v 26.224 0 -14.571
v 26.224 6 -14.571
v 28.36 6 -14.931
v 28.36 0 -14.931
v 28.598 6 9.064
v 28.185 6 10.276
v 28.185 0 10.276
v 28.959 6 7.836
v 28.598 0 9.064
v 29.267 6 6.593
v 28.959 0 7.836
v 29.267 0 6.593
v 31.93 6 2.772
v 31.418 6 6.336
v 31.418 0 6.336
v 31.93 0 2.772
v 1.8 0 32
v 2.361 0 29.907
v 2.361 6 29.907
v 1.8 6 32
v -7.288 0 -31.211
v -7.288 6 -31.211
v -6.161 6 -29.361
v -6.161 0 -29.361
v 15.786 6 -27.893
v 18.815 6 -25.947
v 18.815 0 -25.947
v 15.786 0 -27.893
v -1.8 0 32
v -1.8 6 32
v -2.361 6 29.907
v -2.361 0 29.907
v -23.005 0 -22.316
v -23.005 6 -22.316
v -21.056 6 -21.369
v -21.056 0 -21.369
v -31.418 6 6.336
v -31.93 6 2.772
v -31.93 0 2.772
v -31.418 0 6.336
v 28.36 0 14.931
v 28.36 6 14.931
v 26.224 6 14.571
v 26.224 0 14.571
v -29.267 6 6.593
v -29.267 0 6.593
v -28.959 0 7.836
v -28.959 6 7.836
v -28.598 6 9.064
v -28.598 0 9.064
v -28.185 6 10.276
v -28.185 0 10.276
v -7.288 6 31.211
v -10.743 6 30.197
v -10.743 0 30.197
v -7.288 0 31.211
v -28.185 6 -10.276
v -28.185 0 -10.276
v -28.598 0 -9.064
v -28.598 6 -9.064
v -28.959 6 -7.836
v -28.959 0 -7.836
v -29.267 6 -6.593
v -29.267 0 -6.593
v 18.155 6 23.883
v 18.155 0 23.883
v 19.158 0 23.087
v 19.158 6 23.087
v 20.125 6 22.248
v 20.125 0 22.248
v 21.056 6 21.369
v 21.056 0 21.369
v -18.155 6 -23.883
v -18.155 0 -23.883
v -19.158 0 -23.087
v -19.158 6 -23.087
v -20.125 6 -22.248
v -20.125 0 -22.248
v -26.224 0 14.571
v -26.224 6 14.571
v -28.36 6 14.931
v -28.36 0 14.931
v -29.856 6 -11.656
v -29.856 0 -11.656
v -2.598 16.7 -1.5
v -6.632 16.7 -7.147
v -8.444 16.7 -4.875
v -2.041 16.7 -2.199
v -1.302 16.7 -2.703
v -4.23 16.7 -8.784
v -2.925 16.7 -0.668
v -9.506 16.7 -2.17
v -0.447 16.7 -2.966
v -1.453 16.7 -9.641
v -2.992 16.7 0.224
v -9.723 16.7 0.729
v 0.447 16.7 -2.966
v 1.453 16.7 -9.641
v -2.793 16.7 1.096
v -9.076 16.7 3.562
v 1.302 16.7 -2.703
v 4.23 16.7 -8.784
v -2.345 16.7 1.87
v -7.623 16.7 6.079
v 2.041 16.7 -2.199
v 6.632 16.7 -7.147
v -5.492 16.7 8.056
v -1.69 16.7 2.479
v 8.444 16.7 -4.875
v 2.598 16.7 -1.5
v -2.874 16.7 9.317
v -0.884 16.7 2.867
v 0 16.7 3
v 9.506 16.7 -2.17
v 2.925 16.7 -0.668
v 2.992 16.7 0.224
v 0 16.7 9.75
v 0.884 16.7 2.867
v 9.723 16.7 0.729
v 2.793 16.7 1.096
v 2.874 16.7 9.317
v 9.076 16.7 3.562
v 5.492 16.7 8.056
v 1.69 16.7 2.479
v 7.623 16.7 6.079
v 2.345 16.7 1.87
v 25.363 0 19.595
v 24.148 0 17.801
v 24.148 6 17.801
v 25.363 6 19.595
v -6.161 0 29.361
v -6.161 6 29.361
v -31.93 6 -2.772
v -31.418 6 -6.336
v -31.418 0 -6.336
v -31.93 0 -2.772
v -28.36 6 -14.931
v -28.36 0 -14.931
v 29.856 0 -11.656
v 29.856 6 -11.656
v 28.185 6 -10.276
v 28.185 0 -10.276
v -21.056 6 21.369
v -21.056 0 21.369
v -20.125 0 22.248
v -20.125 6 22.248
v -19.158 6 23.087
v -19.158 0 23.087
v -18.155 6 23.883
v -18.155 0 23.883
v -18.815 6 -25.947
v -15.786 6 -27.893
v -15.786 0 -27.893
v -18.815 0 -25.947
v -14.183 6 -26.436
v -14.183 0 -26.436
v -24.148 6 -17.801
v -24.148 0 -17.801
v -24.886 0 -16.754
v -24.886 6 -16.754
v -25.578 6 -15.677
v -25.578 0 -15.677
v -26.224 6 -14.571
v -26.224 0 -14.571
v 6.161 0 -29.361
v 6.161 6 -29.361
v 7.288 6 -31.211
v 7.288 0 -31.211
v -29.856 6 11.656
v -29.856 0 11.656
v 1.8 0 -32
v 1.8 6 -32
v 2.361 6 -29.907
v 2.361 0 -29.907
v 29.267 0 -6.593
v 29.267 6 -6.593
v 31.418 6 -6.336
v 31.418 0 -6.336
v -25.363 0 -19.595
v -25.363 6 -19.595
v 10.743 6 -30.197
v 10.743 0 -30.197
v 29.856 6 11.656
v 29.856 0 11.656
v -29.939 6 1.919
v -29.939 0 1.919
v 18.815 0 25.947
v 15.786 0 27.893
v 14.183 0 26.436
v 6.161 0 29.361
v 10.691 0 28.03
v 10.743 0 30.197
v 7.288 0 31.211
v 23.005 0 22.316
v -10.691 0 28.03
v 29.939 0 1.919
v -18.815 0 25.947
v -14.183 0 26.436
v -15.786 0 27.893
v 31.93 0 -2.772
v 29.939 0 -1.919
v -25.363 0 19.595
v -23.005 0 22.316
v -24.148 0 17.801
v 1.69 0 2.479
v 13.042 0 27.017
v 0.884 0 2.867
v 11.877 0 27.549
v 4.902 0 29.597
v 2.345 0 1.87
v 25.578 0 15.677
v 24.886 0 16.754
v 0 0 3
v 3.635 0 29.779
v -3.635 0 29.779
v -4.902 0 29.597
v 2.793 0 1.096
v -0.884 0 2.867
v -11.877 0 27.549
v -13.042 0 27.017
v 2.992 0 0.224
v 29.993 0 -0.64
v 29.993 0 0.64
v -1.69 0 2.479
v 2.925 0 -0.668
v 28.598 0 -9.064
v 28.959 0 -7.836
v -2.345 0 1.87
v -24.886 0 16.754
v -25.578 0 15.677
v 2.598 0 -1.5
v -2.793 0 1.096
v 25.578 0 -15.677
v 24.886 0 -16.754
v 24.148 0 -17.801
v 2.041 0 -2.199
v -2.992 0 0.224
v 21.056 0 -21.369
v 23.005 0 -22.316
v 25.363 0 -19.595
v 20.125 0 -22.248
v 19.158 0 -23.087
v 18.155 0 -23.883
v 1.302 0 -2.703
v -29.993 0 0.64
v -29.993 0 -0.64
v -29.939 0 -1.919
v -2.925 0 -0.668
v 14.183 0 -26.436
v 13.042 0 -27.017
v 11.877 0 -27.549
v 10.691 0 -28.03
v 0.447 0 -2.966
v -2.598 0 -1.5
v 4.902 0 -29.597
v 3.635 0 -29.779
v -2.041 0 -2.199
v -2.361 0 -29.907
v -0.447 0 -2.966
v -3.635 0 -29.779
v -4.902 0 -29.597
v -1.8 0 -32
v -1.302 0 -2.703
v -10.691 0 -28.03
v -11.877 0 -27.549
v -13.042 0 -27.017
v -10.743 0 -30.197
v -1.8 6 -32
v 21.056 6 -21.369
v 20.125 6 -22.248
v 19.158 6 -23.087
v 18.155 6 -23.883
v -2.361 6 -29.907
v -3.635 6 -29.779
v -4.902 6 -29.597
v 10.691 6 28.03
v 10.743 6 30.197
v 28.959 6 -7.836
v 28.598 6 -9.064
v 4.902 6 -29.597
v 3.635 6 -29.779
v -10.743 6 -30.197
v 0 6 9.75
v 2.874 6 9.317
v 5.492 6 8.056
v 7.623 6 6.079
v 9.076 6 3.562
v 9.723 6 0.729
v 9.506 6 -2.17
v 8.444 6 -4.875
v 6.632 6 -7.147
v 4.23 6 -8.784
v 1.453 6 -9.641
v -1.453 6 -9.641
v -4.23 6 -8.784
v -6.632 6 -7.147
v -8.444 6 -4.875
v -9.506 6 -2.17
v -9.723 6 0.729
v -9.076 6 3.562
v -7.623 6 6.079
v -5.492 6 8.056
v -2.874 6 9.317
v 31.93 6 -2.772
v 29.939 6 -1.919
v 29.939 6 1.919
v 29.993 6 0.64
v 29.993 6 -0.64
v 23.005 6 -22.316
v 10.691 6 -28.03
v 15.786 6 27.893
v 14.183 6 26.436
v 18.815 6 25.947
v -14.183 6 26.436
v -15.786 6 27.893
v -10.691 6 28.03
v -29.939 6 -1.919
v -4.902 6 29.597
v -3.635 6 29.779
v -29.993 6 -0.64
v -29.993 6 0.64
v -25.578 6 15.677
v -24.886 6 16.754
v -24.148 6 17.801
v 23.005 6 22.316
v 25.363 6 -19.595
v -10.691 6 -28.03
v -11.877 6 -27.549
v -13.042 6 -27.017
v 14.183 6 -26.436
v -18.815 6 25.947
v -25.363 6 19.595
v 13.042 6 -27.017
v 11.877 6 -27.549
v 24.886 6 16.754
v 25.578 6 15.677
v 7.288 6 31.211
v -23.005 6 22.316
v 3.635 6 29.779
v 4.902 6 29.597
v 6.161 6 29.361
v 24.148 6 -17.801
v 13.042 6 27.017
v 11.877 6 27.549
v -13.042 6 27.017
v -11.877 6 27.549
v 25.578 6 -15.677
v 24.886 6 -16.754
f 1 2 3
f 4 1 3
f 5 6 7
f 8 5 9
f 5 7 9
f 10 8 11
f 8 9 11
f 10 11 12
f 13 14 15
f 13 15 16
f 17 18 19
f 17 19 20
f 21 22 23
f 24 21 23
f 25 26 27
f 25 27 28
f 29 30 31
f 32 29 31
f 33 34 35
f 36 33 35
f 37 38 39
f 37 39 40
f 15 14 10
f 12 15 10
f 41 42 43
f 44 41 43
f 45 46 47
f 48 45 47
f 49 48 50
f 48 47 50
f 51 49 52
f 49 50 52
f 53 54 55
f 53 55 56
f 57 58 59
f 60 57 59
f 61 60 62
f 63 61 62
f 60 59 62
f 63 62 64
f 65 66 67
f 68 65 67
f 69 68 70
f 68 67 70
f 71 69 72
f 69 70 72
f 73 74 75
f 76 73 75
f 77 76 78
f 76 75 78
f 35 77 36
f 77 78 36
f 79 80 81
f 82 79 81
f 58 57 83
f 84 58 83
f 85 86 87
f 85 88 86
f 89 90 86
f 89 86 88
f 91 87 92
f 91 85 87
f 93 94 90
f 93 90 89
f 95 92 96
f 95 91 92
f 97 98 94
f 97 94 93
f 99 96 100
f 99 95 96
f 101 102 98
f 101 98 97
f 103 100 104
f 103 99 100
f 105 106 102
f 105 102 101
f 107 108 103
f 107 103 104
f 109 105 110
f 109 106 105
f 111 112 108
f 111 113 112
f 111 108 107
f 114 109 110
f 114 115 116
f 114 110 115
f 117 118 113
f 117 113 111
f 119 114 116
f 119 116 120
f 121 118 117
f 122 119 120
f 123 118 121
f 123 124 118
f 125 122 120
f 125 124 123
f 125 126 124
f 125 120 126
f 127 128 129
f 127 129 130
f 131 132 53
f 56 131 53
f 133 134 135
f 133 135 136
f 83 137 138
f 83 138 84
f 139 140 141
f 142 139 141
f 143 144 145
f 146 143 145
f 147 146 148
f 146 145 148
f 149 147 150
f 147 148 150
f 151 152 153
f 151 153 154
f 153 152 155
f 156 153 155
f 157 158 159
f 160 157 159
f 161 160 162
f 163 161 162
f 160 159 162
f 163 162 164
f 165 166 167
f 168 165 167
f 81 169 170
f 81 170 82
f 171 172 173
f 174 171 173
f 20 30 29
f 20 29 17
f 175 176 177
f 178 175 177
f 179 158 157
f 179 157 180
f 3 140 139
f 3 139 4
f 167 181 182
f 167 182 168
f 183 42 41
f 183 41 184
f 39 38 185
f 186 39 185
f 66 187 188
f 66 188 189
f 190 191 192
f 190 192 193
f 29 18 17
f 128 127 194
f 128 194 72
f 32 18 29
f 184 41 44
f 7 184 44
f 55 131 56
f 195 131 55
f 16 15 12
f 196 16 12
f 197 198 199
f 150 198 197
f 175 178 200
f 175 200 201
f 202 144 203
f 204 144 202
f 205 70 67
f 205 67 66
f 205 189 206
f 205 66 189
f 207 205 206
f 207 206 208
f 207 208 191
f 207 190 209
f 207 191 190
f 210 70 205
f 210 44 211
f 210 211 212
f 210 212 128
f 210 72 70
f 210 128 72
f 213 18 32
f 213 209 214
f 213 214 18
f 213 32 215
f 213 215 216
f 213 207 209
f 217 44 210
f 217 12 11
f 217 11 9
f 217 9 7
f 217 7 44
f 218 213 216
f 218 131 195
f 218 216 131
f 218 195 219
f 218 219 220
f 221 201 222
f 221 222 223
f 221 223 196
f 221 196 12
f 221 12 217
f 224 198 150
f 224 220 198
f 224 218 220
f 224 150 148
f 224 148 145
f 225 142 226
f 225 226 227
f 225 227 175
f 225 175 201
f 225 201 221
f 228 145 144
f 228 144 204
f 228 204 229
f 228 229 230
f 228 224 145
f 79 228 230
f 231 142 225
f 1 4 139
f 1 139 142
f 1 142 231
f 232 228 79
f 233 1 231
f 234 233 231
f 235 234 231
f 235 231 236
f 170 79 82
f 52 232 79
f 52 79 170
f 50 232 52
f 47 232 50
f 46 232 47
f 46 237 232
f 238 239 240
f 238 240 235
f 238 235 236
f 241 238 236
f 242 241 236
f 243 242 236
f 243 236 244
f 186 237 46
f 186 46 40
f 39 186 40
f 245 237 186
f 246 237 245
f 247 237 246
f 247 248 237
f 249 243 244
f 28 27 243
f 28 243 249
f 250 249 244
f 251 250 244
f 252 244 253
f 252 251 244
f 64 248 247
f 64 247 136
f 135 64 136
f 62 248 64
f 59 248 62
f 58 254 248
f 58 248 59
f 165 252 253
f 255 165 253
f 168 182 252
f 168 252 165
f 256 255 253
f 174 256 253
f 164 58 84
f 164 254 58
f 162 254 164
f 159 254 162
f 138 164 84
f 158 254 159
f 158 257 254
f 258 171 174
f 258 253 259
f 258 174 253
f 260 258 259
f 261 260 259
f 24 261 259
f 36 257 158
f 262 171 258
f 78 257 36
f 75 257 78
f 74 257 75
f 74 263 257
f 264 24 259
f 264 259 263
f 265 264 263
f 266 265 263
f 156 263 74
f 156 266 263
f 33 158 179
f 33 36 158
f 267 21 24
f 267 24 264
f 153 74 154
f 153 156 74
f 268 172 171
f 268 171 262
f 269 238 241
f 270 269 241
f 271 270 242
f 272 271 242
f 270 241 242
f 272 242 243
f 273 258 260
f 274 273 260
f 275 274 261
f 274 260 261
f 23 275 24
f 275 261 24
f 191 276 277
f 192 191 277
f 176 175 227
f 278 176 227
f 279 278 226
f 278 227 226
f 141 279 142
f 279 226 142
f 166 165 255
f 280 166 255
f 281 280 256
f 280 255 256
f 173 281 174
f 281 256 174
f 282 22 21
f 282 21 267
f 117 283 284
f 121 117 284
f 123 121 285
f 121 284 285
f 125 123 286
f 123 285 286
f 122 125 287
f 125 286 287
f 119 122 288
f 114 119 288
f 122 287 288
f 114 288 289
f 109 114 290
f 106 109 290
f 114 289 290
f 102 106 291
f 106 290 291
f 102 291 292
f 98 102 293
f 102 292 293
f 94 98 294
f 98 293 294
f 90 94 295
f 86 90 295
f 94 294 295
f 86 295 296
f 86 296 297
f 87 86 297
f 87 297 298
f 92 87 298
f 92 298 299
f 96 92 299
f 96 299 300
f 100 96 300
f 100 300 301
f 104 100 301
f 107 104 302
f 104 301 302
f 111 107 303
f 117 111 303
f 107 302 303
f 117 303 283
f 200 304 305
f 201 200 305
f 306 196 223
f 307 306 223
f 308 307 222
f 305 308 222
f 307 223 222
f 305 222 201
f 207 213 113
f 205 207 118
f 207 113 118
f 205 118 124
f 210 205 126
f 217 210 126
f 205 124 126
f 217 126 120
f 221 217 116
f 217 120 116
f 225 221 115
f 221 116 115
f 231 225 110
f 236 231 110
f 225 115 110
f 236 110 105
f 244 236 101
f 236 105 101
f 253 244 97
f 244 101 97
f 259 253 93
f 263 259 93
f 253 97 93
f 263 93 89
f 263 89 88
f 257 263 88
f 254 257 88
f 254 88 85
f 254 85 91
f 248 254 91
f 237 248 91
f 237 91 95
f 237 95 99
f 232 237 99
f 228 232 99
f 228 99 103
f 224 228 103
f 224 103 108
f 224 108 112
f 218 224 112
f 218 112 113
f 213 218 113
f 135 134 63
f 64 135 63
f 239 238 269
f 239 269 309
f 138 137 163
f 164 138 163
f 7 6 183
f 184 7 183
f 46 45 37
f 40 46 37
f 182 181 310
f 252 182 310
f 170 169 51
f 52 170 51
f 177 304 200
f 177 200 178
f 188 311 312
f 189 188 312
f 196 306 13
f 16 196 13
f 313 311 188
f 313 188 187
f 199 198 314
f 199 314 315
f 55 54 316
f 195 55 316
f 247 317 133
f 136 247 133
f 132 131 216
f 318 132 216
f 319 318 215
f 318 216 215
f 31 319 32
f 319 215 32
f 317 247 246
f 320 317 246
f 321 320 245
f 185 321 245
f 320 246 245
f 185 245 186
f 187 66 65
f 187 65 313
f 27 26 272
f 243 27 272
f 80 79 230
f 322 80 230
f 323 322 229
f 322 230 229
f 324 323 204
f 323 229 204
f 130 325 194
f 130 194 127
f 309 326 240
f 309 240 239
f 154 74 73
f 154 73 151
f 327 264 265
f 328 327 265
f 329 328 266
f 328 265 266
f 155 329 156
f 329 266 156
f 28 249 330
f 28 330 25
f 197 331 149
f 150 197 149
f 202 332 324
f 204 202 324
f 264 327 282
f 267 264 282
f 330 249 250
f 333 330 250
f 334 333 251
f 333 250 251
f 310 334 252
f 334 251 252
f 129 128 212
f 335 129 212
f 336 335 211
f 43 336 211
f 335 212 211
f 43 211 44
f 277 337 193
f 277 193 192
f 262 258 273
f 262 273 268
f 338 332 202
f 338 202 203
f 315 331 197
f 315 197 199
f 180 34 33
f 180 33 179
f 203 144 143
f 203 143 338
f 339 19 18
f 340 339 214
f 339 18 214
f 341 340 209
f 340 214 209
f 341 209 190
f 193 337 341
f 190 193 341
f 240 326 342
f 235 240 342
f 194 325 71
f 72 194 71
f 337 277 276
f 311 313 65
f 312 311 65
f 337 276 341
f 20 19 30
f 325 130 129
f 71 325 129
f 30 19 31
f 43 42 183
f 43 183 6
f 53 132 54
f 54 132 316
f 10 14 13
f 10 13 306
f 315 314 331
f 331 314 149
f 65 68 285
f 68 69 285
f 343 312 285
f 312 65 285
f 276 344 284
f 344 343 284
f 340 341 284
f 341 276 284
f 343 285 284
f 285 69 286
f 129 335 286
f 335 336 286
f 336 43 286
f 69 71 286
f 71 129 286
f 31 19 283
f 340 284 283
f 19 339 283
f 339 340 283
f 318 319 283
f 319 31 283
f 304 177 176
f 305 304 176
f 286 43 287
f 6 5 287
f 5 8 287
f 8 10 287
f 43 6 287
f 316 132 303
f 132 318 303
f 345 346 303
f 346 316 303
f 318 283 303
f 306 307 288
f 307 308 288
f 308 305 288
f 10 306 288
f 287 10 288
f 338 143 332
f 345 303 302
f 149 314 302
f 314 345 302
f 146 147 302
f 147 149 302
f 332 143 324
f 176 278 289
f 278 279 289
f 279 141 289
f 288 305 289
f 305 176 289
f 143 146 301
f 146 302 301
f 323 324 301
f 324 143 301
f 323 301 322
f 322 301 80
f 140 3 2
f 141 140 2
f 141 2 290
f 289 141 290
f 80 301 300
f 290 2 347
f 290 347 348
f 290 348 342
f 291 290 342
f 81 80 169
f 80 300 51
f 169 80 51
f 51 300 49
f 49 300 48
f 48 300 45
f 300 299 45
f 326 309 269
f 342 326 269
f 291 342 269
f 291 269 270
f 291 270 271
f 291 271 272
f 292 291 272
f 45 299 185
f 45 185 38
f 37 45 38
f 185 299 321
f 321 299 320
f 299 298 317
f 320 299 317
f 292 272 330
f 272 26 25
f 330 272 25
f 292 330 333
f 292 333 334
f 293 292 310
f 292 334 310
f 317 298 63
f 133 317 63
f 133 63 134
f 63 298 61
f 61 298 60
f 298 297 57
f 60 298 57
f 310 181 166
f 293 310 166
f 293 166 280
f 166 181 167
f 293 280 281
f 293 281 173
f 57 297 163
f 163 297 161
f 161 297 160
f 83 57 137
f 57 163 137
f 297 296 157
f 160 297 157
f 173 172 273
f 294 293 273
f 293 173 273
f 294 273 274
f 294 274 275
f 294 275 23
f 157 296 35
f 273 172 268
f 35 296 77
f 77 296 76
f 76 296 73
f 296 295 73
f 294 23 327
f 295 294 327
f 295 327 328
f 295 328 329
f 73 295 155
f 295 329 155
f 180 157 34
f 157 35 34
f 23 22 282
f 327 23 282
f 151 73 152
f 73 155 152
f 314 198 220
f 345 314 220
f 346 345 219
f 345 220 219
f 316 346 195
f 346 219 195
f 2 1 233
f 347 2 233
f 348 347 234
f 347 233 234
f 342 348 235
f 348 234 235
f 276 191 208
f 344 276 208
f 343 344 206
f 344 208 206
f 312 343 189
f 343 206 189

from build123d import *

# Parameters (mm, degrees)
SKETCH1_R           = 30
BOSS_EXTRUDE3_DEPTH = 6
BOSS_EXTRUDE2_DEPTH = 6
CIRPATTERN3_COUNT   = 22
SKETCH5_R           = 9.75
BOSS_EXTRUDE4_DEPTH = 10.7
SKETCH6_R           = 3
CUT_EXTRUDE1_DEPTH  = 49.191740155


with BuildPart() as part:
    # Sketch1 → Boss-Extrude3 (new body)
    with BuildSketch(Plane(origin=(0, 0, 0), x_dir=(1, 0, 0), z_dir=(0, 1, 0))):
        with Locations(Location((0, 0, 0), (0, 0, 270))):
            Circle(SKETCH1_R)
    extrude(amount=BOSS_EXTRUDE3_DEPTH)

    # Sketch2 → Boss-Extrude2 (add)
    with BuildSketch(Plane(origin=(0, 6, 0), x_dir=(1, 0, 0), z_dir=(0, 1, 0))):
        Polygon((0, 32), (1.8, 32), (3.407695155, 26), (0, 26), (-3.407695155, 26), (-1.8, 32), align=None)
    boss_extrude2 = extrude(amount=-BOSS_EXTRUDE2_DEPTH)

    # CirPattern3: Boss-Extrude2 ×22 about axis
    cirpattern3_axis = Axis((0, 0, 0), (0, 1, 0))
    for i in range(1, CIRPATTERN3_COUNT):
        add(boss_extrude2.rotate(cirpattern3_axis, i * 360 / CIRPATTERN3_COUNT))

    # Sketch5 → Boss-Extrude4 (add)
    with BuildSketch(Plane(origin=(0, 6, 0), x_dir=(1, 0, 0), z_dir=(0, 1, 0))):
        with Locations(Location((0, 0, 0), (0, 0, 270))):
            Circle(SKETCH5_R)
    extrude(amount=BOSS_EXTRUDE4_DEPTH)

    # Sketch6 → Cut-Extrude1 (cut, through all)
    with BuildSketch(Plane(origin=(0, 16.7, 0), x_dir=(1, 0, 0), z_dir=(0, 1, 0))):
        with Locations(Location((0, 0, 0), (0, 0, 270))):
            Circle(SKETCH6_R)
    extrude(amount=-CUT_EXTRUDE1_DEPTH, mode=Mode.SUBTRACT)


solid = part.part
